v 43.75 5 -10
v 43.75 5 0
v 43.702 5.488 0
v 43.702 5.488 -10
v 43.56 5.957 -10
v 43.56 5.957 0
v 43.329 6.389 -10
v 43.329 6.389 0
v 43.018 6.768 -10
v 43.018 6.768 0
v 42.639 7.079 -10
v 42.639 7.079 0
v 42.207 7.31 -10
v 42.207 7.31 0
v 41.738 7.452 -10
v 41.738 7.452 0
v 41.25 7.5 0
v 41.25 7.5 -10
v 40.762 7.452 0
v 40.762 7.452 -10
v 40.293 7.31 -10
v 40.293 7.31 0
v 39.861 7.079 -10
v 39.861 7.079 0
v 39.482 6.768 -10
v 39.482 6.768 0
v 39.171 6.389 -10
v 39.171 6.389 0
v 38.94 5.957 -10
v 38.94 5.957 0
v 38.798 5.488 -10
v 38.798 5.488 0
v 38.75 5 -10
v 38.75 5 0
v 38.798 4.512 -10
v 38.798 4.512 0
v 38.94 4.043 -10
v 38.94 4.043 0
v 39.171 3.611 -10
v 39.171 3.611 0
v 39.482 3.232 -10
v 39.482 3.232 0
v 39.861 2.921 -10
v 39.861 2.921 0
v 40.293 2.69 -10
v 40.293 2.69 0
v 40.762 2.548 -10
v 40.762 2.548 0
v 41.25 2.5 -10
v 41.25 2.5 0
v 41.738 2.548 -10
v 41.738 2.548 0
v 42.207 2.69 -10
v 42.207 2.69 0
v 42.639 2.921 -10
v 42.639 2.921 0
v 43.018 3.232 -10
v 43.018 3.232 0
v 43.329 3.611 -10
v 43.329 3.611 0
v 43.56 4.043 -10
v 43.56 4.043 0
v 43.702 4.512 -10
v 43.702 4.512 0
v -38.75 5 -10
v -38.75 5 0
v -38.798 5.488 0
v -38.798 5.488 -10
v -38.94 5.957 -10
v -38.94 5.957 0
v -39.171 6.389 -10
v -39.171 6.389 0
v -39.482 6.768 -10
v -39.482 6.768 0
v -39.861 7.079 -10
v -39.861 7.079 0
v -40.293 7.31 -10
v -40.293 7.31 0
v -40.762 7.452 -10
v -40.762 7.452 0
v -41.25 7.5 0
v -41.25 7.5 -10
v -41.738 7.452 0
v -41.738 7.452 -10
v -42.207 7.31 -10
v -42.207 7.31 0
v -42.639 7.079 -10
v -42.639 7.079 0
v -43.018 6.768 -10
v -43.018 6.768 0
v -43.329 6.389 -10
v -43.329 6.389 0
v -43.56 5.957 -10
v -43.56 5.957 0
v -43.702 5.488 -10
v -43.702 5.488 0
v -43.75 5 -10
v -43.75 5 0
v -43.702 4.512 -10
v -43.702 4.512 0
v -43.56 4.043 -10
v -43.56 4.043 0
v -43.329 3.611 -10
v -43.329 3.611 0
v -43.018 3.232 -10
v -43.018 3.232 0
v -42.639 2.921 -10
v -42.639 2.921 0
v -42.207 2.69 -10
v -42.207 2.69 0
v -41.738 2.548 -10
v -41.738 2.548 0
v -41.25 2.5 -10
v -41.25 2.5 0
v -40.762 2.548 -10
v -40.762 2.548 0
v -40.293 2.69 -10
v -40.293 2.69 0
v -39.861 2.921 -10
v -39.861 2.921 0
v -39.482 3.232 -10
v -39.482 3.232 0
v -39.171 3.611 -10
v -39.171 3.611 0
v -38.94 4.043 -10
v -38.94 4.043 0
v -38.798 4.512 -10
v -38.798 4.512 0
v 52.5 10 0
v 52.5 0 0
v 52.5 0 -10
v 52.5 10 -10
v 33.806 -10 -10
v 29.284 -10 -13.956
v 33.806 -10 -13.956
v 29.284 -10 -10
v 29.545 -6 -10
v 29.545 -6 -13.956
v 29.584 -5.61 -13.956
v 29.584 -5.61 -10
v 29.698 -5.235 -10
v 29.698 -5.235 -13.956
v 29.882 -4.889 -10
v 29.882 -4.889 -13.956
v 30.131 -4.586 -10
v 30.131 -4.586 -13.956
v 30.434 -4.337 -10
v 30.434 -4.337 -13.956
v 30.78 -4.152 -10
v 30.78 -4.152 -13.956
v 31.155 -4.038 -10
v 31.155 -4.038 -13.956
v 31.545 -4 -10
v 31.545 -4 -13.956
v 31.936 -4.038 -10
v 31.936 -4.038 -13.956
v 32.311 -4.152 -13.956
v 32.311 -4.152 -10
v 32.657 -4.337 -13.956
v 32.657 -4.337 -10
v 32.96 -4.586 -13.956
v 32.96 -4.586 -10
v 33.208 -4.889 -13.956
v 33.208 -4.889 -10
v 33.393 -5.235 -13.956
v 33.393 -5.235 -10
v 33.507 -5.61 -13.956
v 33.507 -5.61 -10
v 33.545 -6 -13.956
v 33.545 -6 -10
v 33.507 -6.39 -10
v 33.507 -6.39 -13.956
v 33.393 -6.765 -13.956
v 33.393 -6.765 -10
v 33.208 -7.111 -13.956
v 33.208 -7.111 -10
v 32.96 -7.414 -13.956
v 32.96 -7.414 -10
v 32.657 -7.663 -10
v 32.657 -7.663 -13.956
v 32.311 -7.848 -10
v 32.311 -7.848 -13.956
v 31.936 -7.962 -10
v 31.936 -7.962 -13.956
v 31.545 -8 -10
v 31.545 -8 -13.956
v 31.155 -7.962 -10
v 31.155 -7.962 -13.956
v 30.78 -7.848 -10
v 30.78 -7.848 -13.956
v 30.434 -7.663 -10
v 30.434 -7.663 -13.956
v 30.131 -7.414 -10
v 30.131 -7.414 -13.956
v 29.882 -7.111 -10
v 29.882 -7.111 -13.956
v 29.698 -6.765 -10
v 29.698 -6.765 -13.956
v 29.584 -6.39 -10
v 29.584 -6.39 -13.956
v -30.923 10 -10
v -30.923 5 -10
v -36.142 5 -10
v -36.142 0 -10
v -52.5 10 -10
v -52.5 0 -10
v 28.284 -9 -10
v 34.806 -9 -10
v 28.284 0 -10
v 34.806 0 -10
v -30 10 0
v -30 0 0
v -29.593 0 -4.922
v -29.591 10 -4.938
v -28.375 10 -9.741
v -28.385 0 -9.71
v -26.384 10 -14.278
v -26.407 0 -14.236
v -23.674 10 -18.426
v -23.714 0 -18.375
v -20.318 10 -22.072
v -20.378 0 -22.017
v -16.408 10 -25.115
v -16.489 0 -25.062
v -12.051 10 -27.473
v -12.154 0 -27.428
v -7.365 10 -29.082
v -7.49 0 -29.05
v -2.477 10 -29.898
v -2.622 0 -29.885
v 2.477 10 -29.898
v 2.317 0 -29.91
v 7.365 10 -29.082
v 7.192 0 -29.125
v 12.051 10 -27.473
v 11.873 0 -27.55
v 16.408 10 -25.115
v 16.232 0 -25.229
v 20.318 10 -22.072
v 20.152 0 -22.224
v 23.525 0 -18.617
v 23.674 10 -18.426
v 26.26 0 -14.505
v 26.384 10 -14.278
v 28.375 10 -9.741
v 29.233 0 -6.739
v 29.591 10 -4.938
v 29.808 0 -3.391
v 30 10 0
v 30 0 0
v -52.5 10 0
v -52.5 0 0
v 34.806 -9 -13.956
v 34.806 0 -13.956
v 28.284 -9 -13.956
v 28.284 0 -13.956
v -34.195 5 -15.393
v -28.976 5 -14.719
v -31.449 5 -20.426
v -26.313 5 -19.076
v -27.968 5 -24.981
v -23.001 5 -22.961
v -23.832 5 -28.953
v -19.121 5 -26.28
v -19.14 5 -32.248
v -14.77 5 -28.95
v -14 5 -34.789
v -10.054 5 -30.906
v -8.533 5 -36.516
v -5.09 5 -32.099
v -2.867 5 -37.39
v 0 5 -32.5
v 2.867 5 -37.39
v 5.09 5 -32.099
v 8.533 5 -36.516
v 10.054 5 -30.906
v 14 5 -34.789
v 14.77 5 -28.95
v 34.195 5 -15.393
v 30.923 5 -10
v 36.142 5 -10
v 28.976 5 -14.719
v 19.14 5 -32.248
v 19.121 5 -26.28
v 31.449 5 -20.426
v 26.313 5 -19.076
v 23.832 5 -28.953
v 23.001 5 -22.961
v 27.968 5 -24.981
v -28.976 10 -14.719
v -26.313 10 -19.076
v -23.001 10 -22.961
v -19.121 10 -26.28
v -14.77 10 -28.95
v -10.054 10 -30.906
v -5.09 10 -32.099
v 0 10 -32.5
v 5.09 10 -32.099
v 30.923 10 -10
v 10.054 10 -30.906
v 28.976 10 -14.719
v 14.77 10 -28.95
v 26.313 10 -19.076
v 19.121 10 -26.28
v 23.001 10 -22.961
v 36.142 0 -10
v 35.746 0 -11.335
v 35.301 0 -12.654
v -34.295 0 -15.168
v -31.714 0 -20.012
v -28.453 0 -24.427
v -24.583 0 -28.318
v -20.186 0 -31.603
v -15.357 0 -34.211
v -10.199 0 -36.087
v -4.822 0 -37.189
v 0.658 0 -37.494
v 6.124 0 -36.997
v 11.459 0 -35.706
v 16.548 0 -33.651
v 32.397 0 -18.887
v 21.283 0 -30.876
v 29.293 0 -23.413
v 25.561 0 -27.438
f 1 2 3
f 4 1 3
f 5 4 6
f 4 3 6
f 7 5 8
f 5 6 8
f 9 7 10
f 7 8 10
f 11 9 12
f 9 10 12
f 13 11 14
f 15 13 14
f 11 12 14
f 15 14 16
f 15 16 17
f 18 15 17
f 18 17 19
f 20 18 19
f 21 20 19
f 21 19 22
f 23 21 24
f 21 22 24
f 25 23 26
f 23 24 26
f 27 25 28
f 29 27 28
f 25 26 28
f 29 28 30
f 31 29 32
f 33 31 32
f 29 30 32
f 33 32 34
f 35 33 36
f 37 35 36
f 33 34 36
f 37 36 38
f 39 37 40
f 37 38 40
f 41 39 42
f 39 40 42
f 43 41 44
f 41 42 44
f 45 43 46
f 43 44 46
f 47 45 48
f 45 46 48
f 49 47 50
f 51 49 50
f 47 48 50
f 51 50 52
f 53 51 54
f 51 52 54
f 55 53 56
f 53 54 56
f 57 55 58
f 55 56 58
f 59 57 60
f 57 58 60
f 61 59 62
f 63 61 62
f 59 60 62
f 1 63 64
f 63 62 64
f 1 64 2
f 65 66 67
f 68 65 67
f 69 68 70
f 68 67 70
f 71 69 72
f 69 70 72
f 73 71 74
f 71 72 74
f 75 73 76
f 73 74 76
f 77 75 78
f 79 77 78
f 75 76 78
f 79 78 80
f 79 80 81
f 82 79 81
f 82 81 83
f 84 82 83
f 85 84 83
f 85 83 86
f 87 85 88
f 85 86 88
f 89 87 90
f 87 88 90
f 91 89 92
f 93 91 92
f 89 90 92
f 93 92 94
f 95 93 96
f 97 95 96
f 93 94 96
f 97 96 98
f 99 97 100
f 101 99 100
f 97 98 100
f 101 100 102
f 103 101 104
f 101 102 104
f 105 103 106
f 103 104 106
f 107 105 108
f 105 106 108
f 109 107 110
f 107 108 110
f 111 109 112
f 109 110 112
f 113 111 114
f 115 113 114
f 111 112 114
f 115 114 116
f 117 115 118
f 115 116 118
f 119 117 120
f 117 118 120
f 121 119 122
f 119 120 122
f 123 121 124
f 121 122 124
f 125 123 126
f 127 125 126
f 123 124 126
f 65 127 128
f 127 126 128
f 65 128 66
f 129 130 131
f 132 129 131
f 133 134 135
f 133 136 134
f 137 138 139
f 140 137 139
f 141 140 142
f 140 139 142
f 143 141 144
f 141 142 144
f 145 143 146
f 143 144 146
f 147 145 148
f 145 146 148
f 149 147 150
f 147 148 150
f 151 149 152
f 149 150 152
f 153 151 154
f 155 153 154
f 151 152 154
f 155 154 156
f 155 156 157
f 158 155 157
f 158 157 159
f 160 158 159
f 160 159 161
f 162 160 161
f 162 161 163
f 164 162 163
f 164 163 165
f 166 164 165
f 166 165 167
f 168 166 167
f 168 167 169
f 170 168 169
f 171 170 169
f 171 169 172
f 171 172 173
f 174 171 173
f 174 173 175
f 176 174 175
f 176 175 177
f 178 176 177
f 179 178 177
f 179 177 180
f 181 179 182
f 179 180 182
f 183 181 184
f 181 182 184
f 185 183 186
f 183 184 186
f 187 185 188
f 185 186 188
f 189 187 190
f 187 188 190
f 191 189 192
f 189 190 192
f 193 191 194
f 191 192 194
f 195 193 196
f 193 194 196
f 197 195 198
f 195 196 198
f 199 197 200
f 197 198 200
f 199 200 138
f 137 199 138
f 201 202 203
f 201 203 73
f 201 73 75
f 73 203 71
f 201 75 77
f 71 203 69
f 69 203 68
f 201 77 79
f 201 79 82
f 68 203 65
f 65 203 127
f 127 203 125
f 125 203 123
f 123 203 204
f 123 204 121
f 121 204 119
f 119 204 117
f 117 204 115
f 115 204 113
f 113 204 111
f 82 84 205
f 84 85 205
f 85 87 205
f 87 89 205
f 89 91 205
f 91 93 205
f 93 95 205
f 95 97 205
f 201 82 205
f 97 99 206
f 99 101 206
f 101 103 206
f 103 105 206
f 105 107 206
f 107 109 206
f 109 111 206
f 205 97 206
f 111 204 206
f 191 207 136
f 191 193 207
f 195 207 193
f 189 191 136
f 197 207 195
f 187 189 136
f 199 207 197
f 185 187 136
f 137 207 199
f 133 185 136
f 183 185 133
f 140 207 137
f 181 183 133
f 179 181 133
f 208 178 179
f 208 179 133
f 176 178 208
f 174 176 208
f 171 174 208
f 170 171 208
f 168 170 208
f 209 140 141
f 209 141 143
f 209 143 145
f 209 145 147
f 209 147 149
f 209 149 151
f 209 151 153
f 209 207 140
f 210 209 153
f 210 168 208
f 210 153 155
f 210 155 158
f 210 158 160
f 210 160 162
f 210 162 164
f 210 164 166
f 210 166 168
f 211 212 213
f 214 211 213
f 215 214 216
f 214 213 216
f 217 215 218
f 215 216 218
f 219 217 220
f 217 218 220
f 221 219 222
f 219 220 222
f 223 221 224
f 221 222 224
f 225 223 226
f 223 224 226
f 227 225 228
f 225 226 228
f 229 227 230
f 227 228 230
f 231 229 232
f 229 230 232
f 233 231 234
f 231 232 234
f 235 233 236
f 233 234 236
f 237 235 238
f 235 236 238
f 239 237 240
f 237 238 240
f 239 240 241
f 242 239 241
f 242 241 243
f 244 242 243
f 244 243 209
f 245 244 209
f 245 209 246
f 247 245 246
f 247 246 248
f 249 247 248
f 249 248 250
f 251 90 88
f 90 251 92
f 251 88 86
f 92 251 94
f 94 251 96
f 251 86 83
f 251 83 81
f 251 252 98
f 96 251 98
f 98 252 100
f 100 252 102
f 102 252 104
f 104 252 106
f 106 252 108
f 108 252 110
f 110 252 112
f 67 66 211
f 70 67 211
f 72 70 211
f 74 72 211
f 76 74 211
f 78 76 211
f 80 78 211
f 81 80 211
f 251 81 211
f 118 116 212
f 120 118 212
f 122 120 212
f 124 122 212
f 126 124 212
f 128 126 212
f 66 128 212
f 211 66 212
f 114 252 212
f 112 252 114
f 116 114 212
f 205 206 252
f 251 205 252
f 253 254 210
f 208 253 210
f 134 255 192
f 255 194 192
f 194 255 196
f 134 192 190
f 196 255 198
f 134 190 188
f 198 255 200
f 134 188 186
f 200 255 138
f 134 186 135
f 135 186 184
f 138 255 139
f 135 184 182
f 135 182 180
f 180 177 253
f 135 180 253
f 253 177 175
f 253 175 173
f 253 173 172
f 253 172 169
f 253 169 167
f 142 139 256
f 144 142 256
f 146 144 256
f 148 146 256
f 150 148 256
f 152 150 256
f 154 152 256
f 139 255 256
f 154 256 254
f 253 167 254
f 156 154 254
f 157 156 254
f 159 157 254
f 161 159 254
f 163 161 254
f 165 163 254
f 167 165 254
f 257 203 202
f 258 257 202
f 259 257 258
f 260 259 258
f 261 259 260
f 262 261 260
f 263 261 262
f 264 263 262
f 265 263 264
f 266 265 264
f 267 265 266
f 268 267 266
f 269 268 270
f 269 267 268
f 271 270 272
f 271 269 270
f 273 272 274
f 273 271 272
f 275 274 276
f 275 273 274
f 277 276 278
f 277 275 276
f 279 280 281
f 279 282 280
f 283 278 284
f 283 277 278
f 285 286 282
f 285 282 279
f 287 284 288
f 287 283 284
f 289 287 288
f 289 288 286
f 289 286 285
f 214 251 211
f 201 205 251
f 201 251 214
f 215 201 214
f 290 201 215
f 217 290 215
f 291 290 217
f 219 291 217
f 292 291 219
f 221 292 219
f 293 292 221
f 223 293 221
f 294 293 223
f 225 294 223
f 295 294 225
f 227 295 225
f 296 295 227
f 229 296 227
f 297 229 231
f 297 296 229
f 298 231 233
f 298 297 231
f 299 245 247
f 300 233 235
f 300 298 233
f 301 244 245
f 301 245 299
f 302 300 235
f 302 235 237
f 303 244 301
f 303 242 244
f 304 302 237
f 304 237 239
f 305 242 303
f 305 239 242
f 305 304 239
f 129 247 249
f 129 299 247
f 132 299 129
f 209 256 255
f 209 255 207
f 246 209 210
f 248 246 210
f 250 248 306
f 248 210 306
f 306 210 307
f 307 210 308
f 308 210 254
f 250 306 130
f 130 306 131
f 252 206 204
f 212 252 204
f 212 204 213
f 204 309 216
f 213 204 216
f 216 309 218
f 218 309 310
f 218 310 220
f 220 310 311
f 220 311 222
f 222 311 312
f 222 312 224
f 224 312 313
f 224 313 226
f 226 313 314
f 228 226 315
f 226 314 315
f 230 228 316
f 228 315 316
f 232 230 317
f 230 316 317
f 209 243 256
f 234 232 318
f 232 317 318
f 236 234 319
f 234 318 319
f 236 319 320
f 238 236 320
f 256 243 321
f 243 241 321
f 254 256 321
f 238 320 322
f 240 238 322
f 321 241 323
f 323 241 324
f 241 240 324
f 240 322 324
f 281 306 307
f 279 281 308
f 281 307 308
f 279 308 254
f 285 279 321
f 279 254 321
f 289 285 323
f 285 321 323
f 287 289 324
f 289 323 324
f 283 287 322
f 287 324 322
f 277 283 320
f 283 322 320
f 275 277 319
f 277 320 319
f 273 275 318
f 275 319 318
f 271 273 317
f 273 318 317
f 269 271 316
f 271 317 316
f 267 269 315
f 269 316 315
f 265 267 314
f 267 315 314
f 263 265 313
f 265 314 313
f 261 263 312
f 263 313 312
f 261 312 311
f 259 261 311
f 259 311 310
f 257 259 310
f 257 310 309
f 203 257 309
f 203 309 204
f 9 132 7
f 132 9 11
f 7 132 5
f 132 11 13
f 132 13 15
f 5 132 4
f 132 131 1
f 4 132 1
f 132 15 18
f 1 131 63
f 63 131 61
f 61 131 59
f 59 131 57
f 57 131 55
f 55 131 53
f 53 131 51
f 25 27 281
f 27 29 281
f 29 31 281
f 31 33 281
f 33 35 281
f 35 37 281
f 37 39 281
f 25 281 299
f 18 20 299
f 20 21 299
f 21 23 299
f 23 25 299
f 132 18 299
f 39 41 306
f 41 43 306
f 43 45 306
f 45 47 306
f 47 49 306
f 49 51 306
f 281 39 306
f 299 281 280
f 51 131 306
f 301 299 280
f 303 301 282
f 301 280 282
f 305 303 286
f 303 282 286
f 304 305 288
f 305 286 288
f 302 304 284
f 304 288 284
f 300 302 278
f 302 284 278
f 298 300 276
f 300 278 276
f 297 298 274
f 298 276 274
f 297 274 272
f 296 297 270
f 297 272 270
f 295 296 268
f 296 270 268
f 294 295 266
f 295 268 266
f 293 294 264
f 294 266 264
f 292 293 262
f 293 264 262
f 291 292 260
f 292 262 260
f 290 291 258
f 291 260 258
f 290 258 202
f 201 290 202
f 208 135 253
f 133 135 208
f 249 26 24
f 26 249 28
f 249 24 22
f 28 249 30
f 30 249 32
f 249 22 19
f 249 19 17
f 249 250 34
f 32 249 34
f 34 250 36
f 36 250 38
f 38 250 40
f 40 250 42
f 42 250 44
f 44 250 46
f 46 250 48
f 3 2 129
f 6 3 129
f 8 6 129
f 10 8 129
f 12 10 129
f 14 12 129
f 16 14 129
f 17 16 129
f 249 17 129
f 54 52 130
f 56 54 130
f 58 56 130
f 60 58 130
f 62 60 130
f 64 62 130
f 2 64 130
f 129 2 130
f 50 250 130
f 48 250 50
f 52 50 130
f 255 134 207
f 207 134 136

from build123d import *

# Parameters (mm, degrees)
BOSS_EXTRUDE1_DEPTH = 10
SKETCH3_R           = 2.5
CUT_EXTRUDE1_DEPTH  = 10
BOSS_EXTRUDE2_DEPTH = 5
SKETCH9_W           = 6.522192951
SKETCH9_H           = 3.955645811
BOSS_EXTRUDE3_DEPTH = 10
CHAMFER1_SIZE       = 1
SKETCH12_R          = 2
CUT_EXTRUDE4_DEPTH  = 10


with BuildPart() as part:
    # Sketch1 → Boss-Extrude1 (new body)
    with BuildSketch(Plane(origin=(0, 0, 0), x_dir=(1, 0, 0), z_dir=(0, 1, 0))):
        with BuildLine():
            Line((52.5, 10), (30.923292192, 10))
            ThreePointArc((30.923292192, 10), (0, 32.5), (-30.923292192, 10))
            Line((-30.923292192, 10), (-52.5, 10))
            Line((-52.5, 10), (-52.5, 0))
            Line((-52.5, 0), (-30, 0))
            ThreePointArc((-30, 0), (0, 30), (30, 0))
            Line((30, 0), (52.5, 0))
            Line((52.5, 0), (52.5, 10))
        make_face()
    extrude(amount=BOSS_EXTRUDE1_DEPTH)

    # Sketch3 → Cut-Extrude1 (cut)
    with BuildSketch(Plane.XY):
        with Locations((-41.25, 5)):
            Circle(SKETCH3_R)
        with Locations((41.25, 5)):
            Circle(SKETCH3_R)
    extrude(amount=-CUT_EXTRUDE1_DEPTH, mode=Mode.SUBTRACT)

    # Sketch5 → Boss-Extrude2 (add)
    with BuildSketch(Plane(origin=(0, 0, 0), x_dir=(1, 0, 0), z_dir=(0, 1, 0))):
        with BuildLine():
            ThreePointArc((37.5, 0), (0, 37.5), (-37.5, 0))
            Line((-37.5, 0), (-32.5, 0))
            ThreePointArc((-32.5, 0), (0, 32.5), (32.5, 0))
            Line((32.5, 0), (37.5, 0))
        make_face()
    extrude(amount=BOSS_EXTRUDE2_DEPTH)

    # Sketch9 → Boss-Extrude3 (add)
    with BuildSketch(Plane.XZ):
        with Locations((31.545367723, -11.977822906)):
            Rectangle(SKETCH9_W, SKETCH9_H)
    extrude(amount=BOSS_EXTRUDE3_DEPTH)

    # Chamfer1
    chamfer1_edges = [part.edges().sort_by_distance(p)[0] for p in [
        (28.284271247, -10, -11.977822906),
        (34.806464198, -10, -11.977822906),
    ]]
    chamfer(chamfer1_edges, length=CHAMFER1_SIZE)

    # Sketch12 → Cut-Extrude4 (cut)
    with BuildSketch(Plane(origin=(0, 0, -13.955645811), x_dir=(-1, 0, 0), z_dir=(0, 0, -1))):
        with Locations((-31.545367723, -6)):
            Circle(SKETCH12_R)
    extrude(amount=-CUT_EXTRUDE4_DEPTH, mode=Mode.SUBTRACT)


solid = part.part
